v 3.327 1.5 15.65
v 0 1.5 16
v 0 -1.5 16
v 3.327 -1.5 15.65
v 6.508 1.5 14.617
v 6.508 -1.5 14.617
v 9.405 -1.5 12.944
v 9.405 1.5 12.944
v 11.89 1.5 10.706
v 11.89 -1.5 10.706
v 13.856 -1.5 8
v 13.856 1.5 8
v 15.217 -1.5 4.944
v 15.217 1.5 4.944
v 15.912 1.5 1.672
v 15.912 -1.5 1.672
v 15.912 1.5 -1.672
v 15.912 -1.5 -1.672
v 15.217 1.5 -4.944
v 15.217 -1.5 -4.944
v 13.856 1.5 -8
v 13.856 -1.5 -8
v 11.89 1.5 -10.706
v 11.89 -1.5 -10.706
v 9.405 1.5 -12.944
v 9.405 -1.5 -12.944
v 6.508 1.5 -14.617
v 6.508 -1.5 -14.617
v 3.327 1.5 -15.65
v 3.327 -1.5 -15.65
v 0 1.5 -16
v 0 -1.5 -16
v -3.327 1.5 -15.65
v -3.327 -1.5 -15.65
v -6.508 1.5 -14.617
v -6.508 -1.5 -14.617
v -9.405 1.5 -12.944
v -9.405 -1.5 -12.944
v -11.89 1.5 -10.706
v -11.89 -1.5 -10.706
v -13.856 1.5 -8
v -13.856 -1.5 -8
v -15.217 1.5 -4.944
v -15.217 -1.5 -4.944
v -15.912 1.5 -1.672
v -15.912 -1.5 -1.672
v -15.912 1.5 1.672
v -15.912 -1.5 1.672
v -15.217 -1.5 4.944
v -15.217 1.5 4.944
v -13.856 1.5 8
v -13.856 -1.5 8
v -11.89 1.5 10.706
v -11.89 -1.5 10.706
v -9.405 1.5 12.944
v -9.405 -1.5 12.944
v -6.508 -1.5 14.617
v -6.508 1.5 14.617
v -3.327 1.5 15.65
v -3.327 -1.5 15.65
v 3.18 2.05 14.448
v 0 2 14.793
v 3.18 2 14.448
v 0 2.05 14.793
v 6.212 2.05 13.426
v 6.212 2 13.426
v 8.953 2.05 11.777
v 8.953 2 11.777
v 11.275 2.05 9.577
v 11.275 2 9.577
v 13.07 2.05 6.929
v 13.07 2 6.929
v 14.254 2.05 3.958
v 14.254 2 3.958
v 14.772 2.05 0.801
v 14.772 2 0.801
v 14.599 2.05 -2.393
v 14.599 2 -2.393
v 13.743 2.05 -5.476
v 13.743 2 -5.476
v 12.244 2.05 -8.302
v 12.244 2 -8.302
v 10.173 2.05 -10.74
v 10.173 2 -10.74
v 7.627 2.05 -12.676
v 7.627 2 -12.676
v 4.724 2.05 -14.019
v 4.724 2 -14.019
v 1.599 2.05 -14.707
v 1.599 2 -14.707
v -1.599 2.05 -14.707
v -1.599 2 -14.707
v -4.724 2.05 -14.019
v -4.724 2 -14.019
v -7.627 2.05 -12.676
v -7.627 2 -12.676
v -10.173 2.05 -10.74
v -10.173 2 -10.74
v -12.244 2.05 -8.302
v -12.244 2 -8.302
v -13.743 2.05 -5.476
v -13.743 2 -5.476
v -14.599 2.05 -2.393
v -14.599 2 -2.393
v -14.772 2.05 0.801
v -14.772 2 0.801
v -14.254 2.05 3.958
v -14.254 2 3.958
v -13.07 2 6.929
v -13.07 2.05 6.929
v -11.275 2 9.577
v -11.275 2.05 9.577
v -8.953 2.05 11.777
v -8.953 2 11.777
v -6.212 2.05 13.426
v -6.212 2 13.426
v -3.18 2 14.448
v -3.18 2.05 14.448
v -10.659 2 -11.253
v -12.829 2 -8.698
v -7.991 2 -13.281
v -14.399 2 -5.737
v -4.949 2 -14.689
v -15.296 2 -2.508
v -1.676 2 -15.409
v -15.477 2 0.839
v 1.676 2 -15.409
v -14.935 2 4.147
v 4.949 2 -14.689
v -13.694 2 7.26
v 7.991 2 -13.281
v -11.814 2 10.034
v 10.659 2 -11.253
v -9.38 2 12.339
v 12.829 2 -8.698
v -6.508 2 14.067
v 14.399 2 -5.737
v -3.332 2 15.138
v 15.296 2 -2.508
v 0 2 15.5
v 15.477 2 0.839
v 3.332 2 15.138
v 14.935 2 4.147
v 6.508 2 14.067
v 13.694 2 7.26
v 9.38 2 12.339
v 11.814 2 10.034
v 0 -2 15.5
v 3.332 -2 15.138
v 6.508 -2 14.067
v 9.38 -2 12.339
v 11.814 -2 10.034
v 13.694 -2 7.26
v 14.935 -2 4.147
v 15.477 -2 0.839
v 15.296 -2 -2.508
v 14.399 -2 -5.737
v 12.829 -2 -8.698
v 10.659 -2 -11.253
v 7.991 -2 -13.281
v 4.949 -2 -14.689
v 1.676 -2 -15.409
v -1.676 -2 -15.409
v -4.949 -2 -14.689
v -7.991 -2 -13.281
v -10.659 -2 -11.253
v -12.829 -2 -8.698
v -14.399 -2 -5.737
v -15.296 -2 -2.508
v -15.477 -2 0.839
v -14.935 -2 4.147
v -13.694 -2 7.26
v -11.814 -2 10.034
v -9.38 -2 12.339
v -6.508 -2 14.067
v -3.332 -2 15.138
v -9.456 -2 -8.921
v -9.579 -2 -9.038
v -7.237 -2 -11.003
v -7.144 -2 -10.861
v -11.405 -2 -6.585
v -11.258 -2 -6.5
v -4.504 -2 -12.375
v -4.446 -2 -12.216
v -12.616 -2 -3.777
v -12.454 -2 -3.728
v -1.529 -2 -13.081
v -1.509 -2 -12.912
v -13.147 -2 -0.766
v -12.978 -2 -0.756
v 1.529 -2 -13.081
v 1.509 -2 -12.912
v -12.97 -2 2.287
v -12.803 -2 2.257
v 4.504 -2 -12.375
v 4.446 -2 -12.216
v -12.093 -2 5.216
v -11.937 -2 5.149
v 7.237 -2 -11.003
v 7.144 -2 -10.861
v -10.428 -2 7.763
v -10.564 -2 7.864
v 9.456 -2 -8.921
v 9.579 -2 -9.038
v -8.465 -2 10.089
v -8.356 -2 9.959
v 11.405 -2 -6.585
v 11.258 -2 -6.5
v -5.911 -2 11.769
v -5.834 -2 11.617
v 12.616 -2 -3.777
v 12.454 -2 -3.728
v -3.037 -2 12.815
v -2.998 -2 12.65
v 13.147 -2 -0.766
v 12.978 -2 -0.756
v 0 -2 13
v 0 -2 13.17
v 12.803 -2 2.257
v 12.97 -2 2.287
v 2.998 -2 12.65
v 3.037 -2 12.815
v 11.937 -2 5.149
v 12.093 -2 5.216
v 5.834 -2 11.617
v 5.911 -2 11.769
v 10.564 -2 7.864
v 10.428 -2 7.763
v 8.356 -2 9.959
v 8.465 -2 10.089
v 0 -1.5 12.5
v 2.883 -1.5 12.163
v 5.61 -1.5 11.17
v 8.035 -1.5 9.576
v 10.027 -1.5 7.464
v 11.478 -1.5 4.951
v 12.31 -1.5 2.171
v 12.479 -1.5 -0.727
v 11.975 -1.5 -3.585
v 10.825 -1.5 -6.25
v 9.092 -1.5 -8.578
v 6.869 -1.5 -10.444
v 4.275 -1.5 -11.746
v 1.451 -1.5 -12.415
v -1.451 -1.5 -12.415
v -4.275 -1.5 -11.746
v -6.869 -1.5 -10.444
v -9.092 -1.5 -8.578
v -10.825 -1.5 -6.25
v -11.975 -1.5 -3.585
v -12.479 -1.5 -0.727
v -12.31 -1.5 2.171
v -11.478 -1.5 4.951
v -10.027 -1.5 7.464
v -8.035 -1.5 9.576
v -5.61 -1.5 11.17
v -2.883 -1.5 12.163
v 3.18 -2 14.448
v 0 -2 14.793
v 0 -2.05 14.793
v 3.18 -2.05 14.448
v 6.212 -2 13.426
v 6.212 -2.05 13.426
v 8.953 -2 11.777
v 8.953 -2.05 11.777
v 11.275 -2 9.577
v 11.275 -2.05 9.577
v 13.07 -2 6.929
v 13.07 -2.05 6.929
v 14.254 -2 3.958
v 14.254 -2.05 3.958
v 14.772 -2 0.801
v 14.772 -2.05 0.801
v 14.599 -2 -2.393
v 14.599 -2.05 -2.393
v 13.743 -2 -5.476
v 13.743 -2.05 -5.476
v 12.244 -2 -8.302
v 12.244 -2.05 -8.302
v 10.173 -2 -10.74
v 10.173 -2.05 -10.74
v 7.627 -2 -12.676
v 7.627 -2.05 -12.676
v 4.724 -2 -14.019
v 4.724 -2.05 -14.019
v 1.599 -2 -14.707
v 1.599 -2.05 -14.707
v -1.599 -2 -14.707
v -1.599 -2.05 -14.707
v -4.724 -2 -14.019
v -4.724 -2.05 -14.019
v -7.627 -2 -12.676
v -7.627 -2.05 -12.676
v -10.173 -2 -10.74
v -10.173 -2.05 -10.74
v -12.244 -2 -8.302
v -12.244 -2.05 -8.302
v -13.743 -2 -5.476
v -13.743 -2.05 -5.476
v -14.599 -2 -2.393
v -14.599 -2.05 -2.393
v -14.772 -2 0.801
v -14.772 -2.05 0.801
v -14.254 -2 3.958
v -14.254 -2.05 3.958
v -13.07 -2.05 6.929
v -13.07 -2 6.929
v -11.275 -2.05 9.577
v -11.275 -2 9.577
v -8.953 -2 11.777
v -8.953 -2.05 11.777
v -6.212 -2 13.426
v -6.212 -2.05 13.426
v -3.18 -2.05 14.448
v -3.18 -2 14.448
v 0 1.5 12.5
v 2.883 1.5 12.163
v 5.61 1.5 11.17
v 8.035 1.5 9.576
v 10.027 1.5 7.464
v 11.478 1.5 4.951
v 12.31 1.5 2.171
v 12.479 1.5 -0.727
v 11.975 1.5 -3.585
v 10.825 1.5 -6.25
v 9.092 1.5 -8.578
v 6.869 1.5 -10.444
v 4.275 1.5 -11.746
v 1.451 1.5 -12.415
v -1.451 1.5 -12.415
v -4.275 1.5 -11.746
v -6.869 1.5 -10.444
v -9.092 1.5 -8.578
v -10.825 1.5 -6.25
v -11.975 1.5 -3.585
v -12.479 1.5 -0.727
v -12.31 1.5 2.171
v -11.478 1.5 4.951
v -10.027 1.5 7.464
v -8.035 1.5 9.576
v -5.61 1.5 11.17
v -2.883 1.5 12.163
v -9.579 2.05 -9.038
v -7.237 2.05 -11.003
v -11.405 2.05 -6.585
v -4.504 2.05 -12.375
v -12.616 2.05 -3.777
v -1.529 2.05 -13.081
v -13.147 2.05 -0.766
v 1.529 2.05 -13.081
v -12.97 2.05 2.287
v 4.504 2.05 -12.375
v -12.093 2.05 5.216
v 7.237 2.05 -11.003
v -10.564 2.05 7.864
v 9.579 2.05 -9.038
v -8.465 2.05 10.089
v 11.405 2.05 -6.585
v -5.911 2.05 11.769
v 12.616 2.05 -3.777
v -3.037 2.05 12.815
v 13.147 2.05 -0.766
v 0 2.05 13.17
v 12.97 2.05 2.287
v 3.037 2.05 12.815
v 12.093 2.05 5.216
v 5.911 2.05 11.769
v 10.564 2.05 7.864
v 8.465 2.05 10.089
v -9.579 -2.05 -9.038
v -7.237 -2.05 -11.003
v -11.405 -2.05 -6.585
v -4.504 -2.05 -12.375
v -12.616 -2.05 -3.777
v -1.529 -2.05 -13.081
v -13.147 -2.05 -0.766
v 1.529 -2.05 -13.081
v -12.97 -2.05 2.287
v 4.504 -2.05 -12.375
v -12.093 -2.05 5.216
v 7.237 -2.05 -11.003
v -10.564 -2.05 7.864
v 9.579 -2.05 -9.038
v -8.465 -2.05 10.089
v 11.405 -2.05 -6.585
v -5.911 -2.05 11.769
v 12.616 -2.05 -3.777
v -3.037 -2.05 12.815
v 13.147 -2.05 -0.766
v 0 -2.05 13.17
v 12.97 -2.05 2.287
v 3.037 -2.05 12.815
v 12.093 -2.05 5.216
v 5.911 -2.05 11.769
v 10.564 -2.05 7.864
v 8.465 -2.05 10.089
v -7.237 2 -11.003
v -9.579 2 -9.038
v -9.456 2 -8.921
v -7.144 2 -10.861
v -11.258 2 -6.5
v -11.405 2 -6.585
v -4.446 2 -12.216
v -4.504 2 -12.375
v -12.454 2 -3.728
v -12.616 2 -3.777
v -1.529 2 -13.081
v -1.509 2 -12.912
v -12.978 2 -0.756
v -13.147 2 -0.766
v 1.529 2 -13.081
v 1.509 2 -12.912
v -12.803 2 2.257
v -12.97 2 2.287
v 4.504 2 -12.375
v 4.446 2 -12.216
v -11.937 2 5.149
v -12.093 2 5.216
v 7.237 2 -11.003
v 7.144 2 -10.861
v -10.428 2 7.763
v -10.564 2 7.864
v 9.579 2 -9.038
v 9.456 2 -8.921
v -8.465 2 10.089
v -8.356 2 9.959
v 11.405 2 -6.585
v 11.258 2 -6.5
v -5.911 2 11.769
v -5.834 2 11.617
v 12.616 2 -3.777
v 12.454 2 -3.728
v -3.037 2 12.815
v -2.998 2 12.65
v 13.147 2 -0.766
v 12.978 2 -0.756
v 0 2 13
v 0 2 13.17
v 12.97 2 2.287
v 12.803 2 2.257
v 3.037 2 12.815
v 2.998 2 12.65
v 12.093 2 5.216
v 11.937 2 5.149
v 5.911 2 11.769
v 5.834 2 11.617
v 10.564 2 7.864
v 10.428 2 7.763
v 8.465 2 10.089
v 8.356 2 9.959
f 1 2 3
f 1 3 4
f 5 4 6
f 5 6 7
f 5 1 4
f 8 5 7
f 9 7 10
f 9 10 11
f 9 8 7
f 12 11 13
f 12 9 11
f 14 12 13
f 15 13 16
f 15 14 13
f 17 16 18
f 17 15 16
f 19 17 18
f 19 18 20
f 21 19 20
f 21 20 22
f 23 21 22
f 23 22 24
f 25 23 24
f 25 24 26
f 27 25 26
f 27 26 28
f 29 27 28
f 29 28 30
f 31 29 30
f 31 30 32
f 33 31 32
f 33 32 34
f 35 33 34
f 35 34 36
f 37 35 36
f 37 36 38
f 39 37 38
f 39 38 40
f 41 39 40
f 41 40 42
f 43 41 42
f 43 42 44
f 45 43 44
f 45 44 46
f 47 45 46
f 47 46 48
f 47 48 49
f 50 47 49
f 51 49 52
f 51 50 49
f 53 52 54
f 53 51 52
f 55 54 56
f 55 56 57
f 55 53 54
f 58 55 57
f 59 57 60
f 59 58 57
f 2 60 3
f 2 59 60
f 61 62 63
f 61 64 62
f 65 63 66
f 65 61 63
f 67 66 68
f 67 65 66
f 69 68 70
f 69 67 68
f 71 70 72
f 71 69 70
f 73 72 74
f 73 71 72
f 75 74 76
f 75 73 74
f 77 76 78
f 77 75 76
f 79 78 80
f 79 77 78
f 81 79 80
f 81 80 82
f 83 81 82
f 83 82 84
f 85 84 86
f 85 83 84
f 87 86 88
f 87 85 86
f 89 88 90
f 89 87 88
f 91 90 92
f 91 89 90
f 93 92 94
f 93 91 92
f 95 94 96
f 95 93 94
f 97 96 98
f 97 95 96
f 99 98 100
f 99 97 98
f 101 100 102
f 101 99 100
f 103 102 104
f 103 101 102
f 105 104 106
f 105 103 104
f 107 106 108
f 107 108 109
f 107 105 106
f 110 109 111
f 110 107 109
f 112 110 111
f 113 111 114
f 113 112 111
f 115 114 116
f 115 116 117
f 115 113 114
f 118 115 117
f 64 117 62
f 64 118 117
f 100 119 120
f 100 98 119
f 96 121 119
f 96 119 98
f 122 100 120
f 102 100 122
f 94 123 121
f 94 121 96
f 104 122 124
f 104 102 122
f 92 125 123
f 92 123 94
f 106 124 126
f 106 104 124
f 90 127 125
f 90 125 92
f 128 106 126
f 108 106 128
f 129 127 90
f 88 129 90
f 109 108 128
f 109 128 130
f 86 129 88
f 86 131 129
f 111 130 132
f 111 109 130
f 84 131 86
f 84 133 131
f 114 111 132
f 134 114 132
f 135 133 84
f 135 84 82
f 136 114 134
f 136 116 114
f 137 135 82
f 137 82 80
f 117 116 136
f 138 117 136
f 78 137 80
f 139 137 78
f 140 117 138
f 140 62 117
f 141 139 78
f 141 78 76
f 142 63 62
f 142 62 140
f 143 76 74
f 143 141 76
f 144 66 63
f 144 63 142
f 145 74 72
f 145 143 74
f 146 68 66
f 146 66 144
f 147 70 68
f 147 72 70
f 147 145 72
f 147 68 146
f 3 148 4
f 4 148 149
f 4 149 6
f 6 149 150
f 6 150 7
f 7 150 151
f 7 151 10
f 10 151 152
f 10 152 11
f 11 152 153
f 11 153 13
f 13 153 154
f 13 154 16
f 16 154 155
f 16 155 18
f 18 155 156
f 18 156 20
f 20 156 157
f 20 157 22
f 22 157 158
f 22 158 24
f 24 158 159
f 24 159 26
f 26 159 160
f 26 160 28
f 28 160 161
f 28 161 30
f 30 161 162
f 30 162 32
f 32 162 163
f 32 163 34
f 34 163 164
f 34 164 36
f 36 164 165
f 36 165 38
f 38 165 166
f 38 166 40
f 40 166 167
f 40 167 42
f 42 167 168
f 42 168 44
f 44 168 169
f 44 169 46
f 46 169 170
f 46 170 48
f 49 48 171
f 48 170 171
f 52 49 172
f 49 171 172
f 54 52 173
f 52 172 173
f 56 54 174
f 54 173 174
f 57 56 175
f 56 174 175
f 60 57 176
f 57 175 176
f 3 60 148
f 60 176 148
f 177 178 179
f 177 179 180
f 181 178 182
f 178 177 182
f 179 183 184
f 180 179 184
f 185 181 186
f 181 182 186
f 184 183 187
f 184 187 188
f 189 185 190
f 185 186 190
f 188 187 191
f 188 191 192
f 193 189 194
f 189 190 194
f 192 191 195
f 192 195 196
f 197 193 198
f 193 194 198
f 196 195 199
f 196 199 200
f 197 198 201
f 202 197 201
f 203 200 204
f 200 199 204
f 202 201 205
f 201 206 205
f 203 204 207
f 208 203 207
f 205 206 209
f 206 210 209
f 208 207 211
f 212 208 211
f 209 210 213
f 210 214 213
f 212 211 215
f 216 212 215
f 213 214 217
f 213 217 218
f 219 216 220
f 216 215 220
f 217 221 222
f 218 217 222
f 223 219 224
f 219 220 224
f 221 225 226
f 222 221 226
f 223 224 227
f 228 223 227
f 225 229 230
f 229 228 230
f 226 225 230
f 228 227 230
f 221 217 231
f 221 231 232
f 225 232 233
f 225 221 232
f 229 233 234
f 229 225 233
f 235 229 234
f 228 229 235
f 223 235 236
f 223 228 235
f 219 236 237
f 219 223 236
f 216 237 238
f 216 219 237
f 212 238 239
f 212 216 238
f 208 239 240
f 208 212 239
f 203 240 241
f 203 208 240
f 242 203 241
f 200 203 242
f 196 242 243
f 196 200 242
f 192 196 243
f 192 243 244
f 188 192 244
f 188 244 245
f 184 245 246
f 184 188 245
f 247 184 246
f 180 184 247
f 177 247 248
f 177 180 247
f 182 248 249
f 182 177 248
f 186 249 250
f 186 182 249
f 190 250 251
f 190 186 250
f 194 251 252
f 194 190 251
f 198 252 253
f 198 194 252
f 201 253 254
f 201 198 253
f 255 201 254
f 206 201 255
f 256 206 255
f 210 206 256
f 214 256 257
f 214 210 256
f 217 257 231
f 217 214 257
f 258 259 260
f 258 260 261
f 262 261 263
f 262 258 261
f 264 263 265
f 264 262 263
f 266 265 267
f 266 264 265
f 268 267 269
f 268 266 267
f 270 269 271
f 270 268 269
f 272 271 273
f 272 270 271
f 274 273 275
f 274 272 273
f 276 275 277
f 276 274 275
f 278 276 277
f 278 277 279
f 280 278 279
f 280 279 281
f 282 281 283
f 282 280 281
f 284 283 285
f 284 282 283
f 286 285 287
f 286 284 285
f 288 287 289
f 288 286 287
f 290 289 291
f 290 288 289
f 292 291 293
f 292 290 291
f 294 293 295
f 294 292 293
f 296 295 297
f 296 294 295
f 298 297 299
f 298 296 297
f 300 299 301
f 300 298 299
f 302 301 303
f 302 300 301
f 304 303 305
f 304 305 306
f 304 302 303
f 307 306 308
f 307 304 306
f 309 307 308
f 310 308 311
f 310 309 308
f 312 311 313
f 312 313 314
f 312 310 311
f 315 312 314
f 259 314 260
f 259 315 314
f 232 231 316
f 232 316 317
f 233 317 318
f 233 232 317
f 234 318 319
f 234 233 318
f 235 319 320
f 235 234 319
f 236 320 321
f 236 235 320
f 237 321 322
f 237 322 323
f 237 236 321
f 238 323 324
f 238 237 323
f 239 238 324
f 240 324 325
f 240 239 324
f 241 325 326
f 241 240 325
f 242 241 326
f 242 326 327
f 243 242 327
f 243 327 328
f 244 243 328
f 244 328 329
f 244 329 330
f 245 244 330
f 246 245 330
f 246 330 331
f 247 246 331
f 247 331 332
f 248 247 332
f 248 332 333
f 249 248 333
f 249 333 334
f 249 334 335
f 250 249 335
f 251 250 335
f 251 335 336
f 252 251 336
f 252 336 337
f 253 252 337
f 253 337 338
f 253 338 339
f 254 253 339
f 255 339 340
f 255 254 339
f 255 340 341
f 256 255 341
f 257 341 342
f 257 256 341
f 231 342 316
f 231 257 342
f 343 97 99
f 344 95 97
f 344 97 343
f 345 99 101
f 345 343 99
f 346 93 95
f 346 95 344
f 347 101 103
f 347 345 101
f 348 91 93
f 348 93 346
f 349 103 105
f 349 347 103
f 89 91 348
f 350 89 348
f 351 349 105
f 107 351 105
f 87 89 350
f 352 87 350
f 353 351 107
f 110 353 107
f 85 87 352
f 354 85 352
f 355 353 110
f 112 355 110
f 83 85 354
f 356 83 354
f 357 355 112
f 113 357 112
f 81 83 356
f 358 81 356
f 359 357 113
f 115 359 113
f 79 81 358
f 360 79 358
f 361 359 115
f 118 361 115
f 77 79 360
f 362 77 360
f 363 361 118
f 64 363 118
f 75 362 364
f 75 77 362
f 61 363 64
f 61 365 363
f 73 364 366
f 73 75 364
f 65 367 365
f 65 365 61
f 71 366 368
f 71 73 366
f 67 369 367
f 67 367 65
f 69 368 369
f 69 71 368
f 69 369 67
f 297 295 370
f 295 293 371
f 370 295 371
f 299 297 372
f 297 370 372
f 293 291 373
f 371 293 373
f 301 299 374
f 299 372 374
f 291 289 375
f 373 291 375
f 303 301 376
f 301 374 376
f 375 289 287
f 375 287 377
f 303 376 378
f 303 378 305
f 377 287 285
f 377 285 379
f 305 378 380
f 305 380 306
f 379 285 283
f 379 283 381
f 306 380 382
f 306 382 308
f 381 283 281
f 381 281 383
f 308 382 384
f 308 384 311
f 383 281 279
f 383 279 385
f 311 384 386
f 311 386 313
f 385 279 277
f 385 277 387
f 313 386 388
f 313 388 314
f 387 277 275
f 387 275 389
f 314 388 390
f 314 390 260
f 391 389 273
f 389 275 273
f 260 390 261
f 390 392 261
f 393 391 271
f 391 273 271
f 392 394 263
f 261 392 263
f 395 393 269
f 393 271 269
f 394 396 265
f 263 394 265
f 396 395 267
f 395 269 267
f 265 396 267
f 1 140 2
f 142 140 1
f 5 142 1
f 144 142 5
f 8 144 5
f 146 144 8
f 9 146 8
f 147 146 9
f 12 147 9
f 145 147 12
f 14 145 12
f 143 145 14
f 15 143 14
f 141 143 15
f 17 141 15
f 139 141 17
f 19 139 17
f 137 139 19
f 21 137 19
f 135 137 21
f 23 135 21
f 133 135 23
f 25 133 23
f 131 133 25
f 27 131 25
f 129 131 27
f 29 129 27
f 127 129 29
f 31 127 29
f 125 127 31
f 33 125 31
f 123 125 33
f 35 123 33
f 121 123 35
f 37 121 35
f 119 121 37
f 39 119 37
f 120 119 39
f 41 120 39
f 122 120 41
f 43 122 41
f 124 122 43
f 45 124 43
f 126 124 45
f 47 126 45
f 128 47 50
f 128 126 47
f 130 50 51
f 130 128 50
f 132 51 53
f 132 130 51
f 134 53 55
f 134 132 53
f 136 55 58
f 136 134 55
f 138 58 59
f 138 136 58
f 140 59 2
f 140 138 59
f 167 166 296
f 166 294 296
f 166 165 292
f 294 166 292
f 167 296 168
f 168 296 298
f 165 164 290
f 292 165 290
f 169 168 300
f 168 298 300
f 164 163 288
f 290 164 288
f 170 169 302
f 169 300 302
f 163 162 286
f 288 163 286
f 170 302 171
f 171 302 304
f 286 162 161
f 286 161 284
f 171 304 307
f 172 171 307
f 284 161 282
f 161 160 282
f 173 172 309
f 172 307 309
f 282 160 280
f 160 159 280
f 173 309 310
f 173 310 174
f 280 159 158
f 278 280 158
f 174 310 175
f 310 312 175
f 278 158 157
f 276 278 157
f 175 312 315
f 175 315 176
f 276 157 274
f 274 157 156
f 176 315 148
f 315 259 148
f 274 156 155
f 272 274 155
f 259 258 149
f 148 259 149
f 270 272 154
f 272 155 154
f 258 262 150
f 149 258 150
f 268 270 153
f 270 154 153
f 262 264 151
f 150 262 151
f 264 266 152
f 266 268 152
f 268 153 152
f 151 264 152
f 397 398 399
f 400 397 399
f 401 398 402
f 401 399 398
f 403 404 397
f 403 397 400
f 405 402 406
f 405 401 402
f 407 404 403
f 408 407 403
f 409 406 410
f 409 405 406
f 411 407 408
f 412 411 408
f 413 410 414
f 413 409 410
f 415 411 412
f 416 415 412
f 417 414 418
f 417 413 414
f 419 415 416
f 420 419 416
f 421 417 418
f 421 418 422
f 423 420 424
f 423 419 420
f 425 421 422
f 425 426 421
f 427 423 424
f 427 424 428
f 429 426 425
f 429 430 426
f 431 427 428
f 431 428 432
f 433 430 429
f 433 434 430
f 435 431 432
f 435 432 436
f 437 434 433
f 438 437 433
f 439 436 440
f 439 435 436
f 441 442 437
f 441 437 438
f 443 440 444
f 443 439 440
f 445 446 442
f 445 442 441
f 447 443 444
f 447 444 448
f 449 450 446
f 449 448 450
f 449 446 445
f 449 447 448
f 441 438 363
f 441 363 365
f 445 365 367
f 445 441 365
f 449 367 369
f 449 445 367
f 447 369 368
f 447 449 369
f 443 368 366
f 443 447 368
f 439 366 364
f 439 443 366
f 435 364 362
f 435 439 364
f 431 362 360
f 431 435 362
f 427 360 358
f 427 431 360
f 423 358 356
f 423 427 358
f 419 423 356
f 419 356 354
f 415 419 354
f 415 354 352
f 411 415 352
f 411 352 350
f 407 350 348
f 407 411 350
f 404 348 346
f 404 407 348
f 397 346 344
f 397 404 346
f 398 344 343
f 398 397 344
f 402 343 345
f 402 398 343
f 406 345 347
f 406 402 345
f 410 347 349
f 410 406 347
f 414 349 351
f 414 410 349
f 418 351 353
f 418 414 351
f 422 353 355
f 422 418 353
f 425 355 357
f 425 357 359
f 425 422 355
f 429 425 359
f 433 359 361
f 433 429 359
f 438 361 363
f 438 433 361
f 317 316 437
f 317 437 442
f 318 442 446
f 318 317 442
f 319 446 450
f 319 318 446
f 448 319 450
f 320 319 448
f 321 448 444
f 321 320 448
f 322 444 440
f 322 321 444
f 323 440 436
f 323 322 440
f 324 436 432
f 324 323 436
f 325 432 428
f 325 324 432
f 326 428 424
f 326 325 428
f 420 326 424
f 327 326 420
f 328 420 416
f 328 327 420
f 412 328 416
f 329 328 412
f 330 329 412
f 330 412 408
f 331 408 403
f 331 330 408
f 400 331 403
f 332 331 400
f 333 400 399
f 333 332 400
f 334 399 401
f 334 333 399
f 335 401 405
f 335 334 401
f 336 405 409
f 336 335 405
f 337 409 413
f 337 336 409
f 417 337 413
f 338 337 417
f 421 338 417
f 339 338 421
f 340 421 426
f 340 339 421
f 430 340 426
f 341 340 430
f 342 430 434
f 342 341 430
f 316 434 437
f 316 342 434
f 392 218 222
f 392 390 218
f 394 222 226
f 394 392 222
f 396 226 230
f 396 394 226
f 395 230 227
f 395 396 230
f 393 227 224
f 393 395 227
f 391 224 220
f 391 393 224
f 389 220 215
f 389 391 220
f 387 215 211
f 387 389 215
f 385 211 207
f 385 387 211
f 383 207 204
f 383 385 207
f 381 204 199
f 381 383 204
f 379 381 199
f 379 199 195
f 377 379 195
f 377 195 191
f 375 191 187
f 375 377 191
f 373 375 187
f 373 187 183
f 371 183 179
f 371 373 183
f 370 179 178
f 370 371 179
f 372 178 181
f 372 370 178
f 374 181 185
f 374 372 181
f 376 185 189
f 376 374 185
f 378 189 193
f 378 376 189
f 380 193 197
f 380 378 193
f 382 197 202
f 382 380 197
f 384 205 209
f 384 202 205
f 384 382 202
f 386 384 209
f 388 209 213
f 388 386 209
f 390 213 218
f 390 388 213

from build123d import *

# Parameters (mm, degrees)
CROQUIS1_R              = 16
CROQUIS1_R_2            = 12.5
SALIENTE_EXTRUIR1_DEPTH = 2
CHAFL_N1_SIZE           = 0.5
CROQUIS2_R              = 14.793460403
CROQUIS2_R_2            = 13.169701353
SALIENTE_EXTRUIR2_DEPTH = 2.05


with BuildPart() as part:
    # Croquis1 → Saliente-Extruir1 (new, symmetric)
    with BuildSketch(Plane(origin=(0, 0, 0), x_dir=(1, 0, 0), z_dir=(0, 1, 0))):
        with Locations(Location((0, 0, 0), (0, 0, 270))):
            Circle(CROQUIS1_R)
        with Locations(Location((0, 0, 0), (0, 0, 270))):
            Circle(CROQUIS1_R_2, mode=Mode.SUBTRACT)
    extrude(amount=SALIENTE_EXTRUIR1_DEPTH, both=True)

    # Chaflán1
    chafl_n1_edges = [part.edges().sort_by_distance(p)[0] for p in [
        (0, -2, -16),
        (0, 2, -16),
        (0, -2, -12.5),
        (0, 2, -12.5),
    ]]
    chamfer(chafl_n1_edges, length=CHAFL_N1_SIZE)

    # Croquis2 → Saliente-Extruir2 (add, symmetric)
    with BuildSketch(Plane(origin=(0, 0, 0), x_dir=(1, 0, 0), z_dir=(0, 1, 0))):
        with Locations(Location((0, 0, 0), (0, 0, 270))):
            Circle(CROQUIS2_R)
        with Locations(Location((0, 0, 0), (0, 0, 270))):
            Circle(CROQUIS2_R_2, mode=Mode.SUBTRACT)
    extrude(amount=SALIENTE_EXTRUIR2_DEPTH, both=True)


solid = part.part
